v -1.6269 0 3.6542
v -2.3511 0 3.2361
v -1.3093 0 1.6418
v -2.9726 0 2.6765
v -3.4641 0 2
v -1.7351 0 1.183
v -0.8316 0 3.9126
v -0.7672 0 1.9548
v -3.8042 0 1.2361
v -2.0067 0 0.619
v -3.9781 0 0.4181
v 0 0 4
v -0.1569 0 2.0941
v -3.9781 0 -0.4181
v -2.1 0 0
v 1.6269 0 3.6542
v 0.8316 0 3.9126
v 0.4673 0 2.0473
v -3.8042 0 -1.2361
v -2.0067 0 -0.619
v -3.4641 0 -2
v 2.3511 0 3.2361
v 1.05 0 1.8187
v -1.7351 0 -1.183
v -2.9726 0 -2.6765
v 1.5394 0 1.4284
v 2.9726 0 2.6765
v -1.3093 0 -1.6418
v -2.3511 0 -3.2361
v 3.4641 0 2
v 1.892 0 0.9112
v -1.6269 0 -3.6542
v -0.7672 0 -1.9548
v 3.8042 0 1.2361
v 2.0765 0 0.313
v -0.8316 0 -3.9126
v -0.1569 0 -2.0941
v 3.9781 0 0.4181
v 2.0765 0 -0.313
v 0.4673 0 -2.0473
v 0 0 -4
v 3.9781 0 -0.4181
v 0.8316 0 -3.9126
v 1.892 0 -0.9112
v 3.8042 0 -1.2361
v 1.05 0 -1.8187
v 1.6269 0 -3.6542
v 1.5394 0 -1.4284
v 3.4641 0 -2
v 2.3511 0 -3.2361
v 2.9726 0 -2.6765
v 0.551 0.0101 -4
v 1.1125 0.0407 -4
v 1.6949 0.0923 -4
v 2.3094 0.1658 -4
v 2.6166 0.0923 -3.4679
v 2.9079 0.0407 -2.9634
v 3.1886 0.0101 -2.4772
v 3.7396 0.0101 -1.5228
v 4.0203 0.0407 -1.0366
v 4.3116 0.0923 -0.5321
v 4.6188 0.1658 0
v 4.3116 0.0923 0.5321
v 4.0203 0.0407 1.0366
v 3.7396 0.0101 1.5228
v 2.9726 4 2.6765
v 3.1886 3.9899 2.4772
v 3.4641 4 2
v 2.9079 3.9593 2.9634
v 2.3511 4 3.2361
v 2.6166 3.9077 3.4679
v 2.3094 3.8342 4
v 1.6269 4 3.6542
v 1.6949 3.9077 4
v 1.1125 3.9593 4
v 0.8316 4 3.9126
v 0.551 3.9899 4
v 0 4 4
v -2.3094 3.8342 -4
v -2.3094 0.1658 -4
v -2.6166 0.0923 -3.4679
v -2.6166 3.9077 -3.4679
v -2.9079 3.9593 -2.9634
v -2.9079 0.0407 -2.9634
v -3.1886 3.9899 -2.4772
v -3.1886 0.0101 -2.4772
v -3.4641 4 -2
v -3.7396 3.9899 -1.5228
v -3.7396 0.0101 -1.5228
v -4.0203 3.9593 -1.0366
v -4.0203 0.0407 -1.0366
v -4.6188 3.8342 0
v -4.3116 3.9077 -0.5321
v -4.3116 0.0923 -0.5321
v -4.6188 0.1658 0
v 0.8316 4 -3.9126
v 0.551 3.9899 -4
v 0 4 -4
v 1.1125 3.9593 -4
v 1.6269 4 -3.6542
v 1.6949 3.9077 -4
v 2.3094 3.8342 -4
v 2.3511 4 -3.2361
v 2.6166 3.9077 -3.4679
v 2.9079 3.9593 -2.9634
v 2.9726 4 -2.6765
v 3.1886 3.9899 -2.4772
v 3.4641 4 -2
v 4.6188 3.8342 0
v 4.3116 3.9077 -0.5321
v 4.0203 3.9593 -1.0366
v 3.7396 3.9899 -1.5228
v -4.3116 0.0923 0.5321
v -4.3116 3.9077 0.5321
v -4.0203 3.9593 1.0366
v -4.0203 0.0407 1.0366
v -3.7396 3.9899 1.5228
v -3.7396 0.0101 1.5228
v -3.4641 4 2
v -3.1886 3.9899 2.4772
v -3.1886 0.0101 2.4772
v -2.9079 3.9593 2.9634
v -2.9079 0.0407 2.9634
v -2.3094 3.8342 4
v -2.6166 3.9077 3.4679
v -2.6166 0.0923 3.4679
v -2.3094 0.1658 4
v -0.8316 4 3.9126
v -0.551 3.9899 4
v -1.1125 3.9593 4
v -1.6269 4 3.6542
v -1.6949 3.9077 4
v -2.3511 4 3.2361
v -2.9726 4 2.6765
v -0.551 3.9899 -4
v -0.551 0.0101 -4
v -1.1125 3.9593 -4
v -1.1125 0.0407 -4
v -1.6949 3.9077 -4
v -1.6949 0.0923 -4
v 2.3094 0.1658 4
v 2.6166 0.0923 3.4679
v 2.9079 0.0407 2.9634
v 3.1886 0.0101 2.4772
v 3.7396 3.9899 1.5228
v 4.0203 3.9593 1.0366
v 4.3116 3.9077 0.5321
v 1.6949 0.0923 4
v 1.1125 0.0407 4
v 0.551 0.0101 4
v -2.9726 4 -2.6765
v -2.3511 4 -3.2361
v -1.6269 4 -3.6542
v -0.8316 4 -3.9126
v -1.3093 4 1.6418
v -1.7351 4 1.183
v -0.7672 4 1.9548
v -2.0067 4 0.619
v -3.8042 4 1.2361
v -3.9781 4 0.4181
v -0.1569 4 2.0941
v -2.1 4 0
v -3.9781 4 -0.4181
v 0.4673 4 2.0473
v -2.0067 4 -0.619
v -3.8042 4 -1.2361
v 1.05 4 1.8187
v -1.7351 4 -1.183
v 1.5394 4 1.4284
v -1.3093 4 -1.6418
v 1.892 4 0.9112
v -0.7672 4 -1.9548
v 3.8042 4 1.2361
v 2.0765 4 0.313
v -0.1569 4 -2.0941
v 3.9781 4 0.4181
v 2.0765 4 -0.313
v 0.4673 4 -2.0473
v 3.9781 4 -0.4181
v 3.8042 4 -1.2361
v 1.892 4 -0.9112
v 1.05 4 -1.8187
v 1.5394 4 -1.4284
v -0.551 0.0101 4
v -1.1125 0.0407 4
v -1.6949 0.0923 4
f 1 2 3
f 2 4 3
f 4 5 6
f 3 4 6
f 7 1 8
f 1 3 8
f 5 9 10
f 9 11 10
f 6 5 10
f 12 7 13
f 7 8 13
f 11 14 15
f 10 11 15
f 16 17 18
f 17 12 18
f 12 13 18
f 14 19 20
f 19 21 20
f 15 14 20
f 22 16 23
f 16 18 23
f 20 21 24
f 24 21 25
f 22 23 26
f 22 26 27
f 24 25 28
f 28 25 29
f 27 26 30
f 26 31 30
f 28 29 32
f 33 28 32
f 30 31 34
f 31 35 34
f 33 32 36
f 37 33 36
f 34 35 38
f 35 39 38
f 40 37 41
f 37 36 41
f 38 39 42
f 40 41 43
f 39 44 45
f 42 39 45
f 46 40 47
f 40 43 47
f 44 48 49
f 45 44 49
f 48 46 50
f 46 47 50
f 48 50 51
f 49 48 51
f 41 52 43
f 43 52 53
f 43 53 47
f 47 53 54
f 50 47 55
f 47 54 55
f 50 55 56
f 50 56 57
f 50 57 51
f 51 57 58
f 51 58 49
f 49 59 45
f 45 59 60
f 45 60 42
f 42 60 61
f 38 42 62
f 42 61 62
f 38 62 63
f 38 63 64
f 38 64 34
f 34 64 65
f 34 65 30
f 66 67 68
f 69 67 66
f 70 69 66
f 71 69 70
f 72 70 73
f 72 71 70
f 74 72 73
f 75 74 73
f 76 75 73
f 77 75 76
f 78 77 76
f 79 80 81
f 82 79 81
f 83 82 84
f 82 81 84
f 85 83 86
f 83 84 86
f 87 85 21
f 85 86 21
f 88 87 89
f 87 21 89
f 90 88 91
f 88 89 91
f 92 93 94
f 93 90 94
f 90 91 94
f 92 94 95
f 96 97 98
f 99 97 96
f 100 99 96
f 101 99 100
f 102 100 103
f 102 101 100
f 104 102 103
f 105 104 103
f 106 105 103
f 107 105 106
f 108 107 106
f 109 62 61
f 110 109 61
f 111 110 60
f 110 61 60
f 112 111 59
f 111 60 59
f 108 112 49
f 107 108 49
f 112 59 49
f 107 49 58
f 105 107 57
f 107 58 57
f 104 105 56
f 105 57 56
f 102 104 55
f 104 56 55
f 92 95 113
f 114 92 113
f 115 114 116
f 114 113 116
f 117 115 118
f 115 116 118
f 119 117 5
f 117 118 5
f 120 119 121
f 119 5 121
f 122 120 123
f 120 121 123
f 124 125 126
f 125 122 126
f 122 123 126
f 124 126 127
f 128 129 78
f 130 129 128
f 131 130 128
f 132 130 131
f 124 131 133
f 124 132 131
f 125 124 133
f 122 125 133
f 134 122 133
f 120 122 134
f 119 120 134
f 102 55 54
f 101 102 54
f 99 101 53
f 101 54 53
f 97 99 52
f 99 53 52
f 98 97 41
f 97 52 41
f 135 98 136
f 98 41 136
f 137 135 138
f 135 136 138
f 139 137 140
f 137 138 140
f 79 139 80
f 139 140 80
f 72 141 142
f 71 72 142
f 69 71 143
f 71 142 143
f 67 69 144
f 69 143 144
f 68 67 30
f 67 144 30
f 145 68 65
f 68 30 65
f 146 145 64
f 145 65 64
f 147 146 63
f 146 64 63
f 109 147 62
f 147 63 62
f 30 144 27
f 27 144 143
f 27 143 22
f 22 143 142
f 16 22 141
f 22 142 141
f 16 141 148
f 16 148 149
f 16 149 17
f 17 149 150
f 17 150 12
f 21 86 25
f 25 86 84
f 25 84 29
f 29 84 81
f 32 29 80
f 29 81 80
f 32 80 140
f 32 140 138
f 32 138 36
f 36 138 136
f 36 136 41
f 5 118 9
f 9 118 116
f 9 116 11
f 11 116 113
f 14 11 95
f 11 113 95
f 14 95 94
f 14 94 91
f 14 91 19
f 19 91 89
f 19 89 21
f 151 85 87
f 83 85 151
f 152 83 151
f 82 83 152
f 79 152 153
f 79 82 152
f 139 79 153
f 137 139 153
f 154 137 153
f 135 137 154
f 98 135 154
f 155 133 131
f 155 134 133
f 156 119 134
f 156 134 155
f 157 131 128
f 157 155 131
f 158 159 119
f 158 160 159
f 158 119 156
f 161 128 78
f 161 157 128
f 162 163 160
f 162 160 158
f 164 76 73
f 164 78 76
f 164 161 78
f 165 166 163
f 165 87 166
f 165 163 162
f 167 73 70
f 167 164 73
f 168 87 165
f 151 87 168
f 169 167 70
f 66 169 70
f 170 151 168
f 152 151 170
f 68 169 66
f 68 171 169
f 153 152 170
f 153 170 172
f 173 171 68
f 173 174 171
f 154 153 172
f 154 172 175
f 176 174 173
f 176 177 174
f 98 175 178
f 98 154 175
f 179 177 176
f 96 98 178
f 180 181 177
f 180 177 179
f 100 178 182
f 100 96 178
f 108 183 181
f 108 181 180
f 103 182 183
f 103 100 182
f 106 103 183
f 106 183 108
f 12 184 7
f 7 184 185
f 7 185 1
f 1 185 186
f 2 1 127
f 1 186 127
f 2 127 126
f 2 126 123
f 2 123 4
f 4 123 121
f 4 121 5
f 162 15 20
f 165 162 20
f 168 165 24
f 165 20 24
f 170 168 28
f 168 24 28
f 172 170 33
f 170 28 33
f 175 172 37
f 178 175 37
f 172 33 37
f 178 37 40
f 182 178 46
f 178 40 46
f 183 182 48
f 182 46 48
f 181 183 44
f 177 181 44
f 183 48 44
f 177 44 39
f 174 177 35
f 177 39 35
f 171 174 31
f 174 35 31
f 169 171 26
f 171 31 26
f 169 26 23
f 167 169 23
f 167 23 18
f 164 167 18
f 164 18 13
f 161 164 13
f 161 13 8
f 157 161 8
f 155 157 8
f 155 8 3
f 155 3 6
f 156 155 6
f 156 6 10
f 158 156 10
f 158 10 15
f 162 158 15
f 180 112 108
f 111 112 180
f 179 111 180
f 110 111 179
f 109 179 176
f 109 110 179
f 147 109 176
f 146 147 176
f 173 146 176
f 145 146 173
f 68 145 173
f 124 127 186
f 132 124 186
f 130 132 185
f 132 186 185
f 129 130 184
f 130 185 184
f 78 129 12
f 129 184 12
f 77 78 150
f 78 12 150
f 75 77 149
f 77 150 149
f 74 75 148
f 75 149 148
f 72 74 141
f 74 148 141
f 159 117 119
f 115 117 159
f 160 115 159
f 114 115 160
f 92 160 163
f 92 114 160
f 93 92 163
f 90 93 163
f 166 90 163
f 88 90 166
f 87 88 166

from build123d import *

# Parameters (mm, degrees)
EXTRUDE_1_DEPTH    = 4
HOLE_WIZARD_M5_1_D = 4.2


with BuildPart() as part:
    # 草图1 → 凸台-拉伸1 (new body)
    with BuildSketch(Plane(origin=(0, 0, 0), x_dir=(1, 0, 0), z_dir=(0, 1, 0))):
        Polygon((4.618802154, 0), (2.309401077, 4), (-2.309401077, 4), (-4.618802154, 0), (-2.309401077, -4), (2.309401077, -4), align=None)
    extrude(amount=EXTRUDE_1_DEPTH)

    # M5 螺纹孔1 (through all)
    with Locations(Plane(origin=(0, 4, 0), x_dir=(1, 0, 0), z_dir=(0, 1, 0))):
        with Locations((0, 0)):
            Hole(HOLE_WIZARD_M5_1_D / 2)

    # 草图4 → 切除-旋转1 (revolve, cut)
    with BuildSketch(Plane(origin=(0, 0, 0), x_dir=(0, 0, -1), z_dir=(1, 0, 0)), mode=Mode.PRIVATE) as cut_revolve_1_sk:
        Polygon((4, 4), (5.578280707, 3.577100959), (4.847725581, 6.644234984), align=None)
        Polygon((4.847725581, -2.644234984), (4, 0), (5.578280707, 0.422899041), align=None)
    revolve(cut_revolve_1_sk.sketch.rotate(Axis((0, 0, 0), (0, -1, 0)), 180), axis=Axis((0, 0, 0), (0, -1, 0)), mode=Mode.SUBTRACT)


solid = part.part
